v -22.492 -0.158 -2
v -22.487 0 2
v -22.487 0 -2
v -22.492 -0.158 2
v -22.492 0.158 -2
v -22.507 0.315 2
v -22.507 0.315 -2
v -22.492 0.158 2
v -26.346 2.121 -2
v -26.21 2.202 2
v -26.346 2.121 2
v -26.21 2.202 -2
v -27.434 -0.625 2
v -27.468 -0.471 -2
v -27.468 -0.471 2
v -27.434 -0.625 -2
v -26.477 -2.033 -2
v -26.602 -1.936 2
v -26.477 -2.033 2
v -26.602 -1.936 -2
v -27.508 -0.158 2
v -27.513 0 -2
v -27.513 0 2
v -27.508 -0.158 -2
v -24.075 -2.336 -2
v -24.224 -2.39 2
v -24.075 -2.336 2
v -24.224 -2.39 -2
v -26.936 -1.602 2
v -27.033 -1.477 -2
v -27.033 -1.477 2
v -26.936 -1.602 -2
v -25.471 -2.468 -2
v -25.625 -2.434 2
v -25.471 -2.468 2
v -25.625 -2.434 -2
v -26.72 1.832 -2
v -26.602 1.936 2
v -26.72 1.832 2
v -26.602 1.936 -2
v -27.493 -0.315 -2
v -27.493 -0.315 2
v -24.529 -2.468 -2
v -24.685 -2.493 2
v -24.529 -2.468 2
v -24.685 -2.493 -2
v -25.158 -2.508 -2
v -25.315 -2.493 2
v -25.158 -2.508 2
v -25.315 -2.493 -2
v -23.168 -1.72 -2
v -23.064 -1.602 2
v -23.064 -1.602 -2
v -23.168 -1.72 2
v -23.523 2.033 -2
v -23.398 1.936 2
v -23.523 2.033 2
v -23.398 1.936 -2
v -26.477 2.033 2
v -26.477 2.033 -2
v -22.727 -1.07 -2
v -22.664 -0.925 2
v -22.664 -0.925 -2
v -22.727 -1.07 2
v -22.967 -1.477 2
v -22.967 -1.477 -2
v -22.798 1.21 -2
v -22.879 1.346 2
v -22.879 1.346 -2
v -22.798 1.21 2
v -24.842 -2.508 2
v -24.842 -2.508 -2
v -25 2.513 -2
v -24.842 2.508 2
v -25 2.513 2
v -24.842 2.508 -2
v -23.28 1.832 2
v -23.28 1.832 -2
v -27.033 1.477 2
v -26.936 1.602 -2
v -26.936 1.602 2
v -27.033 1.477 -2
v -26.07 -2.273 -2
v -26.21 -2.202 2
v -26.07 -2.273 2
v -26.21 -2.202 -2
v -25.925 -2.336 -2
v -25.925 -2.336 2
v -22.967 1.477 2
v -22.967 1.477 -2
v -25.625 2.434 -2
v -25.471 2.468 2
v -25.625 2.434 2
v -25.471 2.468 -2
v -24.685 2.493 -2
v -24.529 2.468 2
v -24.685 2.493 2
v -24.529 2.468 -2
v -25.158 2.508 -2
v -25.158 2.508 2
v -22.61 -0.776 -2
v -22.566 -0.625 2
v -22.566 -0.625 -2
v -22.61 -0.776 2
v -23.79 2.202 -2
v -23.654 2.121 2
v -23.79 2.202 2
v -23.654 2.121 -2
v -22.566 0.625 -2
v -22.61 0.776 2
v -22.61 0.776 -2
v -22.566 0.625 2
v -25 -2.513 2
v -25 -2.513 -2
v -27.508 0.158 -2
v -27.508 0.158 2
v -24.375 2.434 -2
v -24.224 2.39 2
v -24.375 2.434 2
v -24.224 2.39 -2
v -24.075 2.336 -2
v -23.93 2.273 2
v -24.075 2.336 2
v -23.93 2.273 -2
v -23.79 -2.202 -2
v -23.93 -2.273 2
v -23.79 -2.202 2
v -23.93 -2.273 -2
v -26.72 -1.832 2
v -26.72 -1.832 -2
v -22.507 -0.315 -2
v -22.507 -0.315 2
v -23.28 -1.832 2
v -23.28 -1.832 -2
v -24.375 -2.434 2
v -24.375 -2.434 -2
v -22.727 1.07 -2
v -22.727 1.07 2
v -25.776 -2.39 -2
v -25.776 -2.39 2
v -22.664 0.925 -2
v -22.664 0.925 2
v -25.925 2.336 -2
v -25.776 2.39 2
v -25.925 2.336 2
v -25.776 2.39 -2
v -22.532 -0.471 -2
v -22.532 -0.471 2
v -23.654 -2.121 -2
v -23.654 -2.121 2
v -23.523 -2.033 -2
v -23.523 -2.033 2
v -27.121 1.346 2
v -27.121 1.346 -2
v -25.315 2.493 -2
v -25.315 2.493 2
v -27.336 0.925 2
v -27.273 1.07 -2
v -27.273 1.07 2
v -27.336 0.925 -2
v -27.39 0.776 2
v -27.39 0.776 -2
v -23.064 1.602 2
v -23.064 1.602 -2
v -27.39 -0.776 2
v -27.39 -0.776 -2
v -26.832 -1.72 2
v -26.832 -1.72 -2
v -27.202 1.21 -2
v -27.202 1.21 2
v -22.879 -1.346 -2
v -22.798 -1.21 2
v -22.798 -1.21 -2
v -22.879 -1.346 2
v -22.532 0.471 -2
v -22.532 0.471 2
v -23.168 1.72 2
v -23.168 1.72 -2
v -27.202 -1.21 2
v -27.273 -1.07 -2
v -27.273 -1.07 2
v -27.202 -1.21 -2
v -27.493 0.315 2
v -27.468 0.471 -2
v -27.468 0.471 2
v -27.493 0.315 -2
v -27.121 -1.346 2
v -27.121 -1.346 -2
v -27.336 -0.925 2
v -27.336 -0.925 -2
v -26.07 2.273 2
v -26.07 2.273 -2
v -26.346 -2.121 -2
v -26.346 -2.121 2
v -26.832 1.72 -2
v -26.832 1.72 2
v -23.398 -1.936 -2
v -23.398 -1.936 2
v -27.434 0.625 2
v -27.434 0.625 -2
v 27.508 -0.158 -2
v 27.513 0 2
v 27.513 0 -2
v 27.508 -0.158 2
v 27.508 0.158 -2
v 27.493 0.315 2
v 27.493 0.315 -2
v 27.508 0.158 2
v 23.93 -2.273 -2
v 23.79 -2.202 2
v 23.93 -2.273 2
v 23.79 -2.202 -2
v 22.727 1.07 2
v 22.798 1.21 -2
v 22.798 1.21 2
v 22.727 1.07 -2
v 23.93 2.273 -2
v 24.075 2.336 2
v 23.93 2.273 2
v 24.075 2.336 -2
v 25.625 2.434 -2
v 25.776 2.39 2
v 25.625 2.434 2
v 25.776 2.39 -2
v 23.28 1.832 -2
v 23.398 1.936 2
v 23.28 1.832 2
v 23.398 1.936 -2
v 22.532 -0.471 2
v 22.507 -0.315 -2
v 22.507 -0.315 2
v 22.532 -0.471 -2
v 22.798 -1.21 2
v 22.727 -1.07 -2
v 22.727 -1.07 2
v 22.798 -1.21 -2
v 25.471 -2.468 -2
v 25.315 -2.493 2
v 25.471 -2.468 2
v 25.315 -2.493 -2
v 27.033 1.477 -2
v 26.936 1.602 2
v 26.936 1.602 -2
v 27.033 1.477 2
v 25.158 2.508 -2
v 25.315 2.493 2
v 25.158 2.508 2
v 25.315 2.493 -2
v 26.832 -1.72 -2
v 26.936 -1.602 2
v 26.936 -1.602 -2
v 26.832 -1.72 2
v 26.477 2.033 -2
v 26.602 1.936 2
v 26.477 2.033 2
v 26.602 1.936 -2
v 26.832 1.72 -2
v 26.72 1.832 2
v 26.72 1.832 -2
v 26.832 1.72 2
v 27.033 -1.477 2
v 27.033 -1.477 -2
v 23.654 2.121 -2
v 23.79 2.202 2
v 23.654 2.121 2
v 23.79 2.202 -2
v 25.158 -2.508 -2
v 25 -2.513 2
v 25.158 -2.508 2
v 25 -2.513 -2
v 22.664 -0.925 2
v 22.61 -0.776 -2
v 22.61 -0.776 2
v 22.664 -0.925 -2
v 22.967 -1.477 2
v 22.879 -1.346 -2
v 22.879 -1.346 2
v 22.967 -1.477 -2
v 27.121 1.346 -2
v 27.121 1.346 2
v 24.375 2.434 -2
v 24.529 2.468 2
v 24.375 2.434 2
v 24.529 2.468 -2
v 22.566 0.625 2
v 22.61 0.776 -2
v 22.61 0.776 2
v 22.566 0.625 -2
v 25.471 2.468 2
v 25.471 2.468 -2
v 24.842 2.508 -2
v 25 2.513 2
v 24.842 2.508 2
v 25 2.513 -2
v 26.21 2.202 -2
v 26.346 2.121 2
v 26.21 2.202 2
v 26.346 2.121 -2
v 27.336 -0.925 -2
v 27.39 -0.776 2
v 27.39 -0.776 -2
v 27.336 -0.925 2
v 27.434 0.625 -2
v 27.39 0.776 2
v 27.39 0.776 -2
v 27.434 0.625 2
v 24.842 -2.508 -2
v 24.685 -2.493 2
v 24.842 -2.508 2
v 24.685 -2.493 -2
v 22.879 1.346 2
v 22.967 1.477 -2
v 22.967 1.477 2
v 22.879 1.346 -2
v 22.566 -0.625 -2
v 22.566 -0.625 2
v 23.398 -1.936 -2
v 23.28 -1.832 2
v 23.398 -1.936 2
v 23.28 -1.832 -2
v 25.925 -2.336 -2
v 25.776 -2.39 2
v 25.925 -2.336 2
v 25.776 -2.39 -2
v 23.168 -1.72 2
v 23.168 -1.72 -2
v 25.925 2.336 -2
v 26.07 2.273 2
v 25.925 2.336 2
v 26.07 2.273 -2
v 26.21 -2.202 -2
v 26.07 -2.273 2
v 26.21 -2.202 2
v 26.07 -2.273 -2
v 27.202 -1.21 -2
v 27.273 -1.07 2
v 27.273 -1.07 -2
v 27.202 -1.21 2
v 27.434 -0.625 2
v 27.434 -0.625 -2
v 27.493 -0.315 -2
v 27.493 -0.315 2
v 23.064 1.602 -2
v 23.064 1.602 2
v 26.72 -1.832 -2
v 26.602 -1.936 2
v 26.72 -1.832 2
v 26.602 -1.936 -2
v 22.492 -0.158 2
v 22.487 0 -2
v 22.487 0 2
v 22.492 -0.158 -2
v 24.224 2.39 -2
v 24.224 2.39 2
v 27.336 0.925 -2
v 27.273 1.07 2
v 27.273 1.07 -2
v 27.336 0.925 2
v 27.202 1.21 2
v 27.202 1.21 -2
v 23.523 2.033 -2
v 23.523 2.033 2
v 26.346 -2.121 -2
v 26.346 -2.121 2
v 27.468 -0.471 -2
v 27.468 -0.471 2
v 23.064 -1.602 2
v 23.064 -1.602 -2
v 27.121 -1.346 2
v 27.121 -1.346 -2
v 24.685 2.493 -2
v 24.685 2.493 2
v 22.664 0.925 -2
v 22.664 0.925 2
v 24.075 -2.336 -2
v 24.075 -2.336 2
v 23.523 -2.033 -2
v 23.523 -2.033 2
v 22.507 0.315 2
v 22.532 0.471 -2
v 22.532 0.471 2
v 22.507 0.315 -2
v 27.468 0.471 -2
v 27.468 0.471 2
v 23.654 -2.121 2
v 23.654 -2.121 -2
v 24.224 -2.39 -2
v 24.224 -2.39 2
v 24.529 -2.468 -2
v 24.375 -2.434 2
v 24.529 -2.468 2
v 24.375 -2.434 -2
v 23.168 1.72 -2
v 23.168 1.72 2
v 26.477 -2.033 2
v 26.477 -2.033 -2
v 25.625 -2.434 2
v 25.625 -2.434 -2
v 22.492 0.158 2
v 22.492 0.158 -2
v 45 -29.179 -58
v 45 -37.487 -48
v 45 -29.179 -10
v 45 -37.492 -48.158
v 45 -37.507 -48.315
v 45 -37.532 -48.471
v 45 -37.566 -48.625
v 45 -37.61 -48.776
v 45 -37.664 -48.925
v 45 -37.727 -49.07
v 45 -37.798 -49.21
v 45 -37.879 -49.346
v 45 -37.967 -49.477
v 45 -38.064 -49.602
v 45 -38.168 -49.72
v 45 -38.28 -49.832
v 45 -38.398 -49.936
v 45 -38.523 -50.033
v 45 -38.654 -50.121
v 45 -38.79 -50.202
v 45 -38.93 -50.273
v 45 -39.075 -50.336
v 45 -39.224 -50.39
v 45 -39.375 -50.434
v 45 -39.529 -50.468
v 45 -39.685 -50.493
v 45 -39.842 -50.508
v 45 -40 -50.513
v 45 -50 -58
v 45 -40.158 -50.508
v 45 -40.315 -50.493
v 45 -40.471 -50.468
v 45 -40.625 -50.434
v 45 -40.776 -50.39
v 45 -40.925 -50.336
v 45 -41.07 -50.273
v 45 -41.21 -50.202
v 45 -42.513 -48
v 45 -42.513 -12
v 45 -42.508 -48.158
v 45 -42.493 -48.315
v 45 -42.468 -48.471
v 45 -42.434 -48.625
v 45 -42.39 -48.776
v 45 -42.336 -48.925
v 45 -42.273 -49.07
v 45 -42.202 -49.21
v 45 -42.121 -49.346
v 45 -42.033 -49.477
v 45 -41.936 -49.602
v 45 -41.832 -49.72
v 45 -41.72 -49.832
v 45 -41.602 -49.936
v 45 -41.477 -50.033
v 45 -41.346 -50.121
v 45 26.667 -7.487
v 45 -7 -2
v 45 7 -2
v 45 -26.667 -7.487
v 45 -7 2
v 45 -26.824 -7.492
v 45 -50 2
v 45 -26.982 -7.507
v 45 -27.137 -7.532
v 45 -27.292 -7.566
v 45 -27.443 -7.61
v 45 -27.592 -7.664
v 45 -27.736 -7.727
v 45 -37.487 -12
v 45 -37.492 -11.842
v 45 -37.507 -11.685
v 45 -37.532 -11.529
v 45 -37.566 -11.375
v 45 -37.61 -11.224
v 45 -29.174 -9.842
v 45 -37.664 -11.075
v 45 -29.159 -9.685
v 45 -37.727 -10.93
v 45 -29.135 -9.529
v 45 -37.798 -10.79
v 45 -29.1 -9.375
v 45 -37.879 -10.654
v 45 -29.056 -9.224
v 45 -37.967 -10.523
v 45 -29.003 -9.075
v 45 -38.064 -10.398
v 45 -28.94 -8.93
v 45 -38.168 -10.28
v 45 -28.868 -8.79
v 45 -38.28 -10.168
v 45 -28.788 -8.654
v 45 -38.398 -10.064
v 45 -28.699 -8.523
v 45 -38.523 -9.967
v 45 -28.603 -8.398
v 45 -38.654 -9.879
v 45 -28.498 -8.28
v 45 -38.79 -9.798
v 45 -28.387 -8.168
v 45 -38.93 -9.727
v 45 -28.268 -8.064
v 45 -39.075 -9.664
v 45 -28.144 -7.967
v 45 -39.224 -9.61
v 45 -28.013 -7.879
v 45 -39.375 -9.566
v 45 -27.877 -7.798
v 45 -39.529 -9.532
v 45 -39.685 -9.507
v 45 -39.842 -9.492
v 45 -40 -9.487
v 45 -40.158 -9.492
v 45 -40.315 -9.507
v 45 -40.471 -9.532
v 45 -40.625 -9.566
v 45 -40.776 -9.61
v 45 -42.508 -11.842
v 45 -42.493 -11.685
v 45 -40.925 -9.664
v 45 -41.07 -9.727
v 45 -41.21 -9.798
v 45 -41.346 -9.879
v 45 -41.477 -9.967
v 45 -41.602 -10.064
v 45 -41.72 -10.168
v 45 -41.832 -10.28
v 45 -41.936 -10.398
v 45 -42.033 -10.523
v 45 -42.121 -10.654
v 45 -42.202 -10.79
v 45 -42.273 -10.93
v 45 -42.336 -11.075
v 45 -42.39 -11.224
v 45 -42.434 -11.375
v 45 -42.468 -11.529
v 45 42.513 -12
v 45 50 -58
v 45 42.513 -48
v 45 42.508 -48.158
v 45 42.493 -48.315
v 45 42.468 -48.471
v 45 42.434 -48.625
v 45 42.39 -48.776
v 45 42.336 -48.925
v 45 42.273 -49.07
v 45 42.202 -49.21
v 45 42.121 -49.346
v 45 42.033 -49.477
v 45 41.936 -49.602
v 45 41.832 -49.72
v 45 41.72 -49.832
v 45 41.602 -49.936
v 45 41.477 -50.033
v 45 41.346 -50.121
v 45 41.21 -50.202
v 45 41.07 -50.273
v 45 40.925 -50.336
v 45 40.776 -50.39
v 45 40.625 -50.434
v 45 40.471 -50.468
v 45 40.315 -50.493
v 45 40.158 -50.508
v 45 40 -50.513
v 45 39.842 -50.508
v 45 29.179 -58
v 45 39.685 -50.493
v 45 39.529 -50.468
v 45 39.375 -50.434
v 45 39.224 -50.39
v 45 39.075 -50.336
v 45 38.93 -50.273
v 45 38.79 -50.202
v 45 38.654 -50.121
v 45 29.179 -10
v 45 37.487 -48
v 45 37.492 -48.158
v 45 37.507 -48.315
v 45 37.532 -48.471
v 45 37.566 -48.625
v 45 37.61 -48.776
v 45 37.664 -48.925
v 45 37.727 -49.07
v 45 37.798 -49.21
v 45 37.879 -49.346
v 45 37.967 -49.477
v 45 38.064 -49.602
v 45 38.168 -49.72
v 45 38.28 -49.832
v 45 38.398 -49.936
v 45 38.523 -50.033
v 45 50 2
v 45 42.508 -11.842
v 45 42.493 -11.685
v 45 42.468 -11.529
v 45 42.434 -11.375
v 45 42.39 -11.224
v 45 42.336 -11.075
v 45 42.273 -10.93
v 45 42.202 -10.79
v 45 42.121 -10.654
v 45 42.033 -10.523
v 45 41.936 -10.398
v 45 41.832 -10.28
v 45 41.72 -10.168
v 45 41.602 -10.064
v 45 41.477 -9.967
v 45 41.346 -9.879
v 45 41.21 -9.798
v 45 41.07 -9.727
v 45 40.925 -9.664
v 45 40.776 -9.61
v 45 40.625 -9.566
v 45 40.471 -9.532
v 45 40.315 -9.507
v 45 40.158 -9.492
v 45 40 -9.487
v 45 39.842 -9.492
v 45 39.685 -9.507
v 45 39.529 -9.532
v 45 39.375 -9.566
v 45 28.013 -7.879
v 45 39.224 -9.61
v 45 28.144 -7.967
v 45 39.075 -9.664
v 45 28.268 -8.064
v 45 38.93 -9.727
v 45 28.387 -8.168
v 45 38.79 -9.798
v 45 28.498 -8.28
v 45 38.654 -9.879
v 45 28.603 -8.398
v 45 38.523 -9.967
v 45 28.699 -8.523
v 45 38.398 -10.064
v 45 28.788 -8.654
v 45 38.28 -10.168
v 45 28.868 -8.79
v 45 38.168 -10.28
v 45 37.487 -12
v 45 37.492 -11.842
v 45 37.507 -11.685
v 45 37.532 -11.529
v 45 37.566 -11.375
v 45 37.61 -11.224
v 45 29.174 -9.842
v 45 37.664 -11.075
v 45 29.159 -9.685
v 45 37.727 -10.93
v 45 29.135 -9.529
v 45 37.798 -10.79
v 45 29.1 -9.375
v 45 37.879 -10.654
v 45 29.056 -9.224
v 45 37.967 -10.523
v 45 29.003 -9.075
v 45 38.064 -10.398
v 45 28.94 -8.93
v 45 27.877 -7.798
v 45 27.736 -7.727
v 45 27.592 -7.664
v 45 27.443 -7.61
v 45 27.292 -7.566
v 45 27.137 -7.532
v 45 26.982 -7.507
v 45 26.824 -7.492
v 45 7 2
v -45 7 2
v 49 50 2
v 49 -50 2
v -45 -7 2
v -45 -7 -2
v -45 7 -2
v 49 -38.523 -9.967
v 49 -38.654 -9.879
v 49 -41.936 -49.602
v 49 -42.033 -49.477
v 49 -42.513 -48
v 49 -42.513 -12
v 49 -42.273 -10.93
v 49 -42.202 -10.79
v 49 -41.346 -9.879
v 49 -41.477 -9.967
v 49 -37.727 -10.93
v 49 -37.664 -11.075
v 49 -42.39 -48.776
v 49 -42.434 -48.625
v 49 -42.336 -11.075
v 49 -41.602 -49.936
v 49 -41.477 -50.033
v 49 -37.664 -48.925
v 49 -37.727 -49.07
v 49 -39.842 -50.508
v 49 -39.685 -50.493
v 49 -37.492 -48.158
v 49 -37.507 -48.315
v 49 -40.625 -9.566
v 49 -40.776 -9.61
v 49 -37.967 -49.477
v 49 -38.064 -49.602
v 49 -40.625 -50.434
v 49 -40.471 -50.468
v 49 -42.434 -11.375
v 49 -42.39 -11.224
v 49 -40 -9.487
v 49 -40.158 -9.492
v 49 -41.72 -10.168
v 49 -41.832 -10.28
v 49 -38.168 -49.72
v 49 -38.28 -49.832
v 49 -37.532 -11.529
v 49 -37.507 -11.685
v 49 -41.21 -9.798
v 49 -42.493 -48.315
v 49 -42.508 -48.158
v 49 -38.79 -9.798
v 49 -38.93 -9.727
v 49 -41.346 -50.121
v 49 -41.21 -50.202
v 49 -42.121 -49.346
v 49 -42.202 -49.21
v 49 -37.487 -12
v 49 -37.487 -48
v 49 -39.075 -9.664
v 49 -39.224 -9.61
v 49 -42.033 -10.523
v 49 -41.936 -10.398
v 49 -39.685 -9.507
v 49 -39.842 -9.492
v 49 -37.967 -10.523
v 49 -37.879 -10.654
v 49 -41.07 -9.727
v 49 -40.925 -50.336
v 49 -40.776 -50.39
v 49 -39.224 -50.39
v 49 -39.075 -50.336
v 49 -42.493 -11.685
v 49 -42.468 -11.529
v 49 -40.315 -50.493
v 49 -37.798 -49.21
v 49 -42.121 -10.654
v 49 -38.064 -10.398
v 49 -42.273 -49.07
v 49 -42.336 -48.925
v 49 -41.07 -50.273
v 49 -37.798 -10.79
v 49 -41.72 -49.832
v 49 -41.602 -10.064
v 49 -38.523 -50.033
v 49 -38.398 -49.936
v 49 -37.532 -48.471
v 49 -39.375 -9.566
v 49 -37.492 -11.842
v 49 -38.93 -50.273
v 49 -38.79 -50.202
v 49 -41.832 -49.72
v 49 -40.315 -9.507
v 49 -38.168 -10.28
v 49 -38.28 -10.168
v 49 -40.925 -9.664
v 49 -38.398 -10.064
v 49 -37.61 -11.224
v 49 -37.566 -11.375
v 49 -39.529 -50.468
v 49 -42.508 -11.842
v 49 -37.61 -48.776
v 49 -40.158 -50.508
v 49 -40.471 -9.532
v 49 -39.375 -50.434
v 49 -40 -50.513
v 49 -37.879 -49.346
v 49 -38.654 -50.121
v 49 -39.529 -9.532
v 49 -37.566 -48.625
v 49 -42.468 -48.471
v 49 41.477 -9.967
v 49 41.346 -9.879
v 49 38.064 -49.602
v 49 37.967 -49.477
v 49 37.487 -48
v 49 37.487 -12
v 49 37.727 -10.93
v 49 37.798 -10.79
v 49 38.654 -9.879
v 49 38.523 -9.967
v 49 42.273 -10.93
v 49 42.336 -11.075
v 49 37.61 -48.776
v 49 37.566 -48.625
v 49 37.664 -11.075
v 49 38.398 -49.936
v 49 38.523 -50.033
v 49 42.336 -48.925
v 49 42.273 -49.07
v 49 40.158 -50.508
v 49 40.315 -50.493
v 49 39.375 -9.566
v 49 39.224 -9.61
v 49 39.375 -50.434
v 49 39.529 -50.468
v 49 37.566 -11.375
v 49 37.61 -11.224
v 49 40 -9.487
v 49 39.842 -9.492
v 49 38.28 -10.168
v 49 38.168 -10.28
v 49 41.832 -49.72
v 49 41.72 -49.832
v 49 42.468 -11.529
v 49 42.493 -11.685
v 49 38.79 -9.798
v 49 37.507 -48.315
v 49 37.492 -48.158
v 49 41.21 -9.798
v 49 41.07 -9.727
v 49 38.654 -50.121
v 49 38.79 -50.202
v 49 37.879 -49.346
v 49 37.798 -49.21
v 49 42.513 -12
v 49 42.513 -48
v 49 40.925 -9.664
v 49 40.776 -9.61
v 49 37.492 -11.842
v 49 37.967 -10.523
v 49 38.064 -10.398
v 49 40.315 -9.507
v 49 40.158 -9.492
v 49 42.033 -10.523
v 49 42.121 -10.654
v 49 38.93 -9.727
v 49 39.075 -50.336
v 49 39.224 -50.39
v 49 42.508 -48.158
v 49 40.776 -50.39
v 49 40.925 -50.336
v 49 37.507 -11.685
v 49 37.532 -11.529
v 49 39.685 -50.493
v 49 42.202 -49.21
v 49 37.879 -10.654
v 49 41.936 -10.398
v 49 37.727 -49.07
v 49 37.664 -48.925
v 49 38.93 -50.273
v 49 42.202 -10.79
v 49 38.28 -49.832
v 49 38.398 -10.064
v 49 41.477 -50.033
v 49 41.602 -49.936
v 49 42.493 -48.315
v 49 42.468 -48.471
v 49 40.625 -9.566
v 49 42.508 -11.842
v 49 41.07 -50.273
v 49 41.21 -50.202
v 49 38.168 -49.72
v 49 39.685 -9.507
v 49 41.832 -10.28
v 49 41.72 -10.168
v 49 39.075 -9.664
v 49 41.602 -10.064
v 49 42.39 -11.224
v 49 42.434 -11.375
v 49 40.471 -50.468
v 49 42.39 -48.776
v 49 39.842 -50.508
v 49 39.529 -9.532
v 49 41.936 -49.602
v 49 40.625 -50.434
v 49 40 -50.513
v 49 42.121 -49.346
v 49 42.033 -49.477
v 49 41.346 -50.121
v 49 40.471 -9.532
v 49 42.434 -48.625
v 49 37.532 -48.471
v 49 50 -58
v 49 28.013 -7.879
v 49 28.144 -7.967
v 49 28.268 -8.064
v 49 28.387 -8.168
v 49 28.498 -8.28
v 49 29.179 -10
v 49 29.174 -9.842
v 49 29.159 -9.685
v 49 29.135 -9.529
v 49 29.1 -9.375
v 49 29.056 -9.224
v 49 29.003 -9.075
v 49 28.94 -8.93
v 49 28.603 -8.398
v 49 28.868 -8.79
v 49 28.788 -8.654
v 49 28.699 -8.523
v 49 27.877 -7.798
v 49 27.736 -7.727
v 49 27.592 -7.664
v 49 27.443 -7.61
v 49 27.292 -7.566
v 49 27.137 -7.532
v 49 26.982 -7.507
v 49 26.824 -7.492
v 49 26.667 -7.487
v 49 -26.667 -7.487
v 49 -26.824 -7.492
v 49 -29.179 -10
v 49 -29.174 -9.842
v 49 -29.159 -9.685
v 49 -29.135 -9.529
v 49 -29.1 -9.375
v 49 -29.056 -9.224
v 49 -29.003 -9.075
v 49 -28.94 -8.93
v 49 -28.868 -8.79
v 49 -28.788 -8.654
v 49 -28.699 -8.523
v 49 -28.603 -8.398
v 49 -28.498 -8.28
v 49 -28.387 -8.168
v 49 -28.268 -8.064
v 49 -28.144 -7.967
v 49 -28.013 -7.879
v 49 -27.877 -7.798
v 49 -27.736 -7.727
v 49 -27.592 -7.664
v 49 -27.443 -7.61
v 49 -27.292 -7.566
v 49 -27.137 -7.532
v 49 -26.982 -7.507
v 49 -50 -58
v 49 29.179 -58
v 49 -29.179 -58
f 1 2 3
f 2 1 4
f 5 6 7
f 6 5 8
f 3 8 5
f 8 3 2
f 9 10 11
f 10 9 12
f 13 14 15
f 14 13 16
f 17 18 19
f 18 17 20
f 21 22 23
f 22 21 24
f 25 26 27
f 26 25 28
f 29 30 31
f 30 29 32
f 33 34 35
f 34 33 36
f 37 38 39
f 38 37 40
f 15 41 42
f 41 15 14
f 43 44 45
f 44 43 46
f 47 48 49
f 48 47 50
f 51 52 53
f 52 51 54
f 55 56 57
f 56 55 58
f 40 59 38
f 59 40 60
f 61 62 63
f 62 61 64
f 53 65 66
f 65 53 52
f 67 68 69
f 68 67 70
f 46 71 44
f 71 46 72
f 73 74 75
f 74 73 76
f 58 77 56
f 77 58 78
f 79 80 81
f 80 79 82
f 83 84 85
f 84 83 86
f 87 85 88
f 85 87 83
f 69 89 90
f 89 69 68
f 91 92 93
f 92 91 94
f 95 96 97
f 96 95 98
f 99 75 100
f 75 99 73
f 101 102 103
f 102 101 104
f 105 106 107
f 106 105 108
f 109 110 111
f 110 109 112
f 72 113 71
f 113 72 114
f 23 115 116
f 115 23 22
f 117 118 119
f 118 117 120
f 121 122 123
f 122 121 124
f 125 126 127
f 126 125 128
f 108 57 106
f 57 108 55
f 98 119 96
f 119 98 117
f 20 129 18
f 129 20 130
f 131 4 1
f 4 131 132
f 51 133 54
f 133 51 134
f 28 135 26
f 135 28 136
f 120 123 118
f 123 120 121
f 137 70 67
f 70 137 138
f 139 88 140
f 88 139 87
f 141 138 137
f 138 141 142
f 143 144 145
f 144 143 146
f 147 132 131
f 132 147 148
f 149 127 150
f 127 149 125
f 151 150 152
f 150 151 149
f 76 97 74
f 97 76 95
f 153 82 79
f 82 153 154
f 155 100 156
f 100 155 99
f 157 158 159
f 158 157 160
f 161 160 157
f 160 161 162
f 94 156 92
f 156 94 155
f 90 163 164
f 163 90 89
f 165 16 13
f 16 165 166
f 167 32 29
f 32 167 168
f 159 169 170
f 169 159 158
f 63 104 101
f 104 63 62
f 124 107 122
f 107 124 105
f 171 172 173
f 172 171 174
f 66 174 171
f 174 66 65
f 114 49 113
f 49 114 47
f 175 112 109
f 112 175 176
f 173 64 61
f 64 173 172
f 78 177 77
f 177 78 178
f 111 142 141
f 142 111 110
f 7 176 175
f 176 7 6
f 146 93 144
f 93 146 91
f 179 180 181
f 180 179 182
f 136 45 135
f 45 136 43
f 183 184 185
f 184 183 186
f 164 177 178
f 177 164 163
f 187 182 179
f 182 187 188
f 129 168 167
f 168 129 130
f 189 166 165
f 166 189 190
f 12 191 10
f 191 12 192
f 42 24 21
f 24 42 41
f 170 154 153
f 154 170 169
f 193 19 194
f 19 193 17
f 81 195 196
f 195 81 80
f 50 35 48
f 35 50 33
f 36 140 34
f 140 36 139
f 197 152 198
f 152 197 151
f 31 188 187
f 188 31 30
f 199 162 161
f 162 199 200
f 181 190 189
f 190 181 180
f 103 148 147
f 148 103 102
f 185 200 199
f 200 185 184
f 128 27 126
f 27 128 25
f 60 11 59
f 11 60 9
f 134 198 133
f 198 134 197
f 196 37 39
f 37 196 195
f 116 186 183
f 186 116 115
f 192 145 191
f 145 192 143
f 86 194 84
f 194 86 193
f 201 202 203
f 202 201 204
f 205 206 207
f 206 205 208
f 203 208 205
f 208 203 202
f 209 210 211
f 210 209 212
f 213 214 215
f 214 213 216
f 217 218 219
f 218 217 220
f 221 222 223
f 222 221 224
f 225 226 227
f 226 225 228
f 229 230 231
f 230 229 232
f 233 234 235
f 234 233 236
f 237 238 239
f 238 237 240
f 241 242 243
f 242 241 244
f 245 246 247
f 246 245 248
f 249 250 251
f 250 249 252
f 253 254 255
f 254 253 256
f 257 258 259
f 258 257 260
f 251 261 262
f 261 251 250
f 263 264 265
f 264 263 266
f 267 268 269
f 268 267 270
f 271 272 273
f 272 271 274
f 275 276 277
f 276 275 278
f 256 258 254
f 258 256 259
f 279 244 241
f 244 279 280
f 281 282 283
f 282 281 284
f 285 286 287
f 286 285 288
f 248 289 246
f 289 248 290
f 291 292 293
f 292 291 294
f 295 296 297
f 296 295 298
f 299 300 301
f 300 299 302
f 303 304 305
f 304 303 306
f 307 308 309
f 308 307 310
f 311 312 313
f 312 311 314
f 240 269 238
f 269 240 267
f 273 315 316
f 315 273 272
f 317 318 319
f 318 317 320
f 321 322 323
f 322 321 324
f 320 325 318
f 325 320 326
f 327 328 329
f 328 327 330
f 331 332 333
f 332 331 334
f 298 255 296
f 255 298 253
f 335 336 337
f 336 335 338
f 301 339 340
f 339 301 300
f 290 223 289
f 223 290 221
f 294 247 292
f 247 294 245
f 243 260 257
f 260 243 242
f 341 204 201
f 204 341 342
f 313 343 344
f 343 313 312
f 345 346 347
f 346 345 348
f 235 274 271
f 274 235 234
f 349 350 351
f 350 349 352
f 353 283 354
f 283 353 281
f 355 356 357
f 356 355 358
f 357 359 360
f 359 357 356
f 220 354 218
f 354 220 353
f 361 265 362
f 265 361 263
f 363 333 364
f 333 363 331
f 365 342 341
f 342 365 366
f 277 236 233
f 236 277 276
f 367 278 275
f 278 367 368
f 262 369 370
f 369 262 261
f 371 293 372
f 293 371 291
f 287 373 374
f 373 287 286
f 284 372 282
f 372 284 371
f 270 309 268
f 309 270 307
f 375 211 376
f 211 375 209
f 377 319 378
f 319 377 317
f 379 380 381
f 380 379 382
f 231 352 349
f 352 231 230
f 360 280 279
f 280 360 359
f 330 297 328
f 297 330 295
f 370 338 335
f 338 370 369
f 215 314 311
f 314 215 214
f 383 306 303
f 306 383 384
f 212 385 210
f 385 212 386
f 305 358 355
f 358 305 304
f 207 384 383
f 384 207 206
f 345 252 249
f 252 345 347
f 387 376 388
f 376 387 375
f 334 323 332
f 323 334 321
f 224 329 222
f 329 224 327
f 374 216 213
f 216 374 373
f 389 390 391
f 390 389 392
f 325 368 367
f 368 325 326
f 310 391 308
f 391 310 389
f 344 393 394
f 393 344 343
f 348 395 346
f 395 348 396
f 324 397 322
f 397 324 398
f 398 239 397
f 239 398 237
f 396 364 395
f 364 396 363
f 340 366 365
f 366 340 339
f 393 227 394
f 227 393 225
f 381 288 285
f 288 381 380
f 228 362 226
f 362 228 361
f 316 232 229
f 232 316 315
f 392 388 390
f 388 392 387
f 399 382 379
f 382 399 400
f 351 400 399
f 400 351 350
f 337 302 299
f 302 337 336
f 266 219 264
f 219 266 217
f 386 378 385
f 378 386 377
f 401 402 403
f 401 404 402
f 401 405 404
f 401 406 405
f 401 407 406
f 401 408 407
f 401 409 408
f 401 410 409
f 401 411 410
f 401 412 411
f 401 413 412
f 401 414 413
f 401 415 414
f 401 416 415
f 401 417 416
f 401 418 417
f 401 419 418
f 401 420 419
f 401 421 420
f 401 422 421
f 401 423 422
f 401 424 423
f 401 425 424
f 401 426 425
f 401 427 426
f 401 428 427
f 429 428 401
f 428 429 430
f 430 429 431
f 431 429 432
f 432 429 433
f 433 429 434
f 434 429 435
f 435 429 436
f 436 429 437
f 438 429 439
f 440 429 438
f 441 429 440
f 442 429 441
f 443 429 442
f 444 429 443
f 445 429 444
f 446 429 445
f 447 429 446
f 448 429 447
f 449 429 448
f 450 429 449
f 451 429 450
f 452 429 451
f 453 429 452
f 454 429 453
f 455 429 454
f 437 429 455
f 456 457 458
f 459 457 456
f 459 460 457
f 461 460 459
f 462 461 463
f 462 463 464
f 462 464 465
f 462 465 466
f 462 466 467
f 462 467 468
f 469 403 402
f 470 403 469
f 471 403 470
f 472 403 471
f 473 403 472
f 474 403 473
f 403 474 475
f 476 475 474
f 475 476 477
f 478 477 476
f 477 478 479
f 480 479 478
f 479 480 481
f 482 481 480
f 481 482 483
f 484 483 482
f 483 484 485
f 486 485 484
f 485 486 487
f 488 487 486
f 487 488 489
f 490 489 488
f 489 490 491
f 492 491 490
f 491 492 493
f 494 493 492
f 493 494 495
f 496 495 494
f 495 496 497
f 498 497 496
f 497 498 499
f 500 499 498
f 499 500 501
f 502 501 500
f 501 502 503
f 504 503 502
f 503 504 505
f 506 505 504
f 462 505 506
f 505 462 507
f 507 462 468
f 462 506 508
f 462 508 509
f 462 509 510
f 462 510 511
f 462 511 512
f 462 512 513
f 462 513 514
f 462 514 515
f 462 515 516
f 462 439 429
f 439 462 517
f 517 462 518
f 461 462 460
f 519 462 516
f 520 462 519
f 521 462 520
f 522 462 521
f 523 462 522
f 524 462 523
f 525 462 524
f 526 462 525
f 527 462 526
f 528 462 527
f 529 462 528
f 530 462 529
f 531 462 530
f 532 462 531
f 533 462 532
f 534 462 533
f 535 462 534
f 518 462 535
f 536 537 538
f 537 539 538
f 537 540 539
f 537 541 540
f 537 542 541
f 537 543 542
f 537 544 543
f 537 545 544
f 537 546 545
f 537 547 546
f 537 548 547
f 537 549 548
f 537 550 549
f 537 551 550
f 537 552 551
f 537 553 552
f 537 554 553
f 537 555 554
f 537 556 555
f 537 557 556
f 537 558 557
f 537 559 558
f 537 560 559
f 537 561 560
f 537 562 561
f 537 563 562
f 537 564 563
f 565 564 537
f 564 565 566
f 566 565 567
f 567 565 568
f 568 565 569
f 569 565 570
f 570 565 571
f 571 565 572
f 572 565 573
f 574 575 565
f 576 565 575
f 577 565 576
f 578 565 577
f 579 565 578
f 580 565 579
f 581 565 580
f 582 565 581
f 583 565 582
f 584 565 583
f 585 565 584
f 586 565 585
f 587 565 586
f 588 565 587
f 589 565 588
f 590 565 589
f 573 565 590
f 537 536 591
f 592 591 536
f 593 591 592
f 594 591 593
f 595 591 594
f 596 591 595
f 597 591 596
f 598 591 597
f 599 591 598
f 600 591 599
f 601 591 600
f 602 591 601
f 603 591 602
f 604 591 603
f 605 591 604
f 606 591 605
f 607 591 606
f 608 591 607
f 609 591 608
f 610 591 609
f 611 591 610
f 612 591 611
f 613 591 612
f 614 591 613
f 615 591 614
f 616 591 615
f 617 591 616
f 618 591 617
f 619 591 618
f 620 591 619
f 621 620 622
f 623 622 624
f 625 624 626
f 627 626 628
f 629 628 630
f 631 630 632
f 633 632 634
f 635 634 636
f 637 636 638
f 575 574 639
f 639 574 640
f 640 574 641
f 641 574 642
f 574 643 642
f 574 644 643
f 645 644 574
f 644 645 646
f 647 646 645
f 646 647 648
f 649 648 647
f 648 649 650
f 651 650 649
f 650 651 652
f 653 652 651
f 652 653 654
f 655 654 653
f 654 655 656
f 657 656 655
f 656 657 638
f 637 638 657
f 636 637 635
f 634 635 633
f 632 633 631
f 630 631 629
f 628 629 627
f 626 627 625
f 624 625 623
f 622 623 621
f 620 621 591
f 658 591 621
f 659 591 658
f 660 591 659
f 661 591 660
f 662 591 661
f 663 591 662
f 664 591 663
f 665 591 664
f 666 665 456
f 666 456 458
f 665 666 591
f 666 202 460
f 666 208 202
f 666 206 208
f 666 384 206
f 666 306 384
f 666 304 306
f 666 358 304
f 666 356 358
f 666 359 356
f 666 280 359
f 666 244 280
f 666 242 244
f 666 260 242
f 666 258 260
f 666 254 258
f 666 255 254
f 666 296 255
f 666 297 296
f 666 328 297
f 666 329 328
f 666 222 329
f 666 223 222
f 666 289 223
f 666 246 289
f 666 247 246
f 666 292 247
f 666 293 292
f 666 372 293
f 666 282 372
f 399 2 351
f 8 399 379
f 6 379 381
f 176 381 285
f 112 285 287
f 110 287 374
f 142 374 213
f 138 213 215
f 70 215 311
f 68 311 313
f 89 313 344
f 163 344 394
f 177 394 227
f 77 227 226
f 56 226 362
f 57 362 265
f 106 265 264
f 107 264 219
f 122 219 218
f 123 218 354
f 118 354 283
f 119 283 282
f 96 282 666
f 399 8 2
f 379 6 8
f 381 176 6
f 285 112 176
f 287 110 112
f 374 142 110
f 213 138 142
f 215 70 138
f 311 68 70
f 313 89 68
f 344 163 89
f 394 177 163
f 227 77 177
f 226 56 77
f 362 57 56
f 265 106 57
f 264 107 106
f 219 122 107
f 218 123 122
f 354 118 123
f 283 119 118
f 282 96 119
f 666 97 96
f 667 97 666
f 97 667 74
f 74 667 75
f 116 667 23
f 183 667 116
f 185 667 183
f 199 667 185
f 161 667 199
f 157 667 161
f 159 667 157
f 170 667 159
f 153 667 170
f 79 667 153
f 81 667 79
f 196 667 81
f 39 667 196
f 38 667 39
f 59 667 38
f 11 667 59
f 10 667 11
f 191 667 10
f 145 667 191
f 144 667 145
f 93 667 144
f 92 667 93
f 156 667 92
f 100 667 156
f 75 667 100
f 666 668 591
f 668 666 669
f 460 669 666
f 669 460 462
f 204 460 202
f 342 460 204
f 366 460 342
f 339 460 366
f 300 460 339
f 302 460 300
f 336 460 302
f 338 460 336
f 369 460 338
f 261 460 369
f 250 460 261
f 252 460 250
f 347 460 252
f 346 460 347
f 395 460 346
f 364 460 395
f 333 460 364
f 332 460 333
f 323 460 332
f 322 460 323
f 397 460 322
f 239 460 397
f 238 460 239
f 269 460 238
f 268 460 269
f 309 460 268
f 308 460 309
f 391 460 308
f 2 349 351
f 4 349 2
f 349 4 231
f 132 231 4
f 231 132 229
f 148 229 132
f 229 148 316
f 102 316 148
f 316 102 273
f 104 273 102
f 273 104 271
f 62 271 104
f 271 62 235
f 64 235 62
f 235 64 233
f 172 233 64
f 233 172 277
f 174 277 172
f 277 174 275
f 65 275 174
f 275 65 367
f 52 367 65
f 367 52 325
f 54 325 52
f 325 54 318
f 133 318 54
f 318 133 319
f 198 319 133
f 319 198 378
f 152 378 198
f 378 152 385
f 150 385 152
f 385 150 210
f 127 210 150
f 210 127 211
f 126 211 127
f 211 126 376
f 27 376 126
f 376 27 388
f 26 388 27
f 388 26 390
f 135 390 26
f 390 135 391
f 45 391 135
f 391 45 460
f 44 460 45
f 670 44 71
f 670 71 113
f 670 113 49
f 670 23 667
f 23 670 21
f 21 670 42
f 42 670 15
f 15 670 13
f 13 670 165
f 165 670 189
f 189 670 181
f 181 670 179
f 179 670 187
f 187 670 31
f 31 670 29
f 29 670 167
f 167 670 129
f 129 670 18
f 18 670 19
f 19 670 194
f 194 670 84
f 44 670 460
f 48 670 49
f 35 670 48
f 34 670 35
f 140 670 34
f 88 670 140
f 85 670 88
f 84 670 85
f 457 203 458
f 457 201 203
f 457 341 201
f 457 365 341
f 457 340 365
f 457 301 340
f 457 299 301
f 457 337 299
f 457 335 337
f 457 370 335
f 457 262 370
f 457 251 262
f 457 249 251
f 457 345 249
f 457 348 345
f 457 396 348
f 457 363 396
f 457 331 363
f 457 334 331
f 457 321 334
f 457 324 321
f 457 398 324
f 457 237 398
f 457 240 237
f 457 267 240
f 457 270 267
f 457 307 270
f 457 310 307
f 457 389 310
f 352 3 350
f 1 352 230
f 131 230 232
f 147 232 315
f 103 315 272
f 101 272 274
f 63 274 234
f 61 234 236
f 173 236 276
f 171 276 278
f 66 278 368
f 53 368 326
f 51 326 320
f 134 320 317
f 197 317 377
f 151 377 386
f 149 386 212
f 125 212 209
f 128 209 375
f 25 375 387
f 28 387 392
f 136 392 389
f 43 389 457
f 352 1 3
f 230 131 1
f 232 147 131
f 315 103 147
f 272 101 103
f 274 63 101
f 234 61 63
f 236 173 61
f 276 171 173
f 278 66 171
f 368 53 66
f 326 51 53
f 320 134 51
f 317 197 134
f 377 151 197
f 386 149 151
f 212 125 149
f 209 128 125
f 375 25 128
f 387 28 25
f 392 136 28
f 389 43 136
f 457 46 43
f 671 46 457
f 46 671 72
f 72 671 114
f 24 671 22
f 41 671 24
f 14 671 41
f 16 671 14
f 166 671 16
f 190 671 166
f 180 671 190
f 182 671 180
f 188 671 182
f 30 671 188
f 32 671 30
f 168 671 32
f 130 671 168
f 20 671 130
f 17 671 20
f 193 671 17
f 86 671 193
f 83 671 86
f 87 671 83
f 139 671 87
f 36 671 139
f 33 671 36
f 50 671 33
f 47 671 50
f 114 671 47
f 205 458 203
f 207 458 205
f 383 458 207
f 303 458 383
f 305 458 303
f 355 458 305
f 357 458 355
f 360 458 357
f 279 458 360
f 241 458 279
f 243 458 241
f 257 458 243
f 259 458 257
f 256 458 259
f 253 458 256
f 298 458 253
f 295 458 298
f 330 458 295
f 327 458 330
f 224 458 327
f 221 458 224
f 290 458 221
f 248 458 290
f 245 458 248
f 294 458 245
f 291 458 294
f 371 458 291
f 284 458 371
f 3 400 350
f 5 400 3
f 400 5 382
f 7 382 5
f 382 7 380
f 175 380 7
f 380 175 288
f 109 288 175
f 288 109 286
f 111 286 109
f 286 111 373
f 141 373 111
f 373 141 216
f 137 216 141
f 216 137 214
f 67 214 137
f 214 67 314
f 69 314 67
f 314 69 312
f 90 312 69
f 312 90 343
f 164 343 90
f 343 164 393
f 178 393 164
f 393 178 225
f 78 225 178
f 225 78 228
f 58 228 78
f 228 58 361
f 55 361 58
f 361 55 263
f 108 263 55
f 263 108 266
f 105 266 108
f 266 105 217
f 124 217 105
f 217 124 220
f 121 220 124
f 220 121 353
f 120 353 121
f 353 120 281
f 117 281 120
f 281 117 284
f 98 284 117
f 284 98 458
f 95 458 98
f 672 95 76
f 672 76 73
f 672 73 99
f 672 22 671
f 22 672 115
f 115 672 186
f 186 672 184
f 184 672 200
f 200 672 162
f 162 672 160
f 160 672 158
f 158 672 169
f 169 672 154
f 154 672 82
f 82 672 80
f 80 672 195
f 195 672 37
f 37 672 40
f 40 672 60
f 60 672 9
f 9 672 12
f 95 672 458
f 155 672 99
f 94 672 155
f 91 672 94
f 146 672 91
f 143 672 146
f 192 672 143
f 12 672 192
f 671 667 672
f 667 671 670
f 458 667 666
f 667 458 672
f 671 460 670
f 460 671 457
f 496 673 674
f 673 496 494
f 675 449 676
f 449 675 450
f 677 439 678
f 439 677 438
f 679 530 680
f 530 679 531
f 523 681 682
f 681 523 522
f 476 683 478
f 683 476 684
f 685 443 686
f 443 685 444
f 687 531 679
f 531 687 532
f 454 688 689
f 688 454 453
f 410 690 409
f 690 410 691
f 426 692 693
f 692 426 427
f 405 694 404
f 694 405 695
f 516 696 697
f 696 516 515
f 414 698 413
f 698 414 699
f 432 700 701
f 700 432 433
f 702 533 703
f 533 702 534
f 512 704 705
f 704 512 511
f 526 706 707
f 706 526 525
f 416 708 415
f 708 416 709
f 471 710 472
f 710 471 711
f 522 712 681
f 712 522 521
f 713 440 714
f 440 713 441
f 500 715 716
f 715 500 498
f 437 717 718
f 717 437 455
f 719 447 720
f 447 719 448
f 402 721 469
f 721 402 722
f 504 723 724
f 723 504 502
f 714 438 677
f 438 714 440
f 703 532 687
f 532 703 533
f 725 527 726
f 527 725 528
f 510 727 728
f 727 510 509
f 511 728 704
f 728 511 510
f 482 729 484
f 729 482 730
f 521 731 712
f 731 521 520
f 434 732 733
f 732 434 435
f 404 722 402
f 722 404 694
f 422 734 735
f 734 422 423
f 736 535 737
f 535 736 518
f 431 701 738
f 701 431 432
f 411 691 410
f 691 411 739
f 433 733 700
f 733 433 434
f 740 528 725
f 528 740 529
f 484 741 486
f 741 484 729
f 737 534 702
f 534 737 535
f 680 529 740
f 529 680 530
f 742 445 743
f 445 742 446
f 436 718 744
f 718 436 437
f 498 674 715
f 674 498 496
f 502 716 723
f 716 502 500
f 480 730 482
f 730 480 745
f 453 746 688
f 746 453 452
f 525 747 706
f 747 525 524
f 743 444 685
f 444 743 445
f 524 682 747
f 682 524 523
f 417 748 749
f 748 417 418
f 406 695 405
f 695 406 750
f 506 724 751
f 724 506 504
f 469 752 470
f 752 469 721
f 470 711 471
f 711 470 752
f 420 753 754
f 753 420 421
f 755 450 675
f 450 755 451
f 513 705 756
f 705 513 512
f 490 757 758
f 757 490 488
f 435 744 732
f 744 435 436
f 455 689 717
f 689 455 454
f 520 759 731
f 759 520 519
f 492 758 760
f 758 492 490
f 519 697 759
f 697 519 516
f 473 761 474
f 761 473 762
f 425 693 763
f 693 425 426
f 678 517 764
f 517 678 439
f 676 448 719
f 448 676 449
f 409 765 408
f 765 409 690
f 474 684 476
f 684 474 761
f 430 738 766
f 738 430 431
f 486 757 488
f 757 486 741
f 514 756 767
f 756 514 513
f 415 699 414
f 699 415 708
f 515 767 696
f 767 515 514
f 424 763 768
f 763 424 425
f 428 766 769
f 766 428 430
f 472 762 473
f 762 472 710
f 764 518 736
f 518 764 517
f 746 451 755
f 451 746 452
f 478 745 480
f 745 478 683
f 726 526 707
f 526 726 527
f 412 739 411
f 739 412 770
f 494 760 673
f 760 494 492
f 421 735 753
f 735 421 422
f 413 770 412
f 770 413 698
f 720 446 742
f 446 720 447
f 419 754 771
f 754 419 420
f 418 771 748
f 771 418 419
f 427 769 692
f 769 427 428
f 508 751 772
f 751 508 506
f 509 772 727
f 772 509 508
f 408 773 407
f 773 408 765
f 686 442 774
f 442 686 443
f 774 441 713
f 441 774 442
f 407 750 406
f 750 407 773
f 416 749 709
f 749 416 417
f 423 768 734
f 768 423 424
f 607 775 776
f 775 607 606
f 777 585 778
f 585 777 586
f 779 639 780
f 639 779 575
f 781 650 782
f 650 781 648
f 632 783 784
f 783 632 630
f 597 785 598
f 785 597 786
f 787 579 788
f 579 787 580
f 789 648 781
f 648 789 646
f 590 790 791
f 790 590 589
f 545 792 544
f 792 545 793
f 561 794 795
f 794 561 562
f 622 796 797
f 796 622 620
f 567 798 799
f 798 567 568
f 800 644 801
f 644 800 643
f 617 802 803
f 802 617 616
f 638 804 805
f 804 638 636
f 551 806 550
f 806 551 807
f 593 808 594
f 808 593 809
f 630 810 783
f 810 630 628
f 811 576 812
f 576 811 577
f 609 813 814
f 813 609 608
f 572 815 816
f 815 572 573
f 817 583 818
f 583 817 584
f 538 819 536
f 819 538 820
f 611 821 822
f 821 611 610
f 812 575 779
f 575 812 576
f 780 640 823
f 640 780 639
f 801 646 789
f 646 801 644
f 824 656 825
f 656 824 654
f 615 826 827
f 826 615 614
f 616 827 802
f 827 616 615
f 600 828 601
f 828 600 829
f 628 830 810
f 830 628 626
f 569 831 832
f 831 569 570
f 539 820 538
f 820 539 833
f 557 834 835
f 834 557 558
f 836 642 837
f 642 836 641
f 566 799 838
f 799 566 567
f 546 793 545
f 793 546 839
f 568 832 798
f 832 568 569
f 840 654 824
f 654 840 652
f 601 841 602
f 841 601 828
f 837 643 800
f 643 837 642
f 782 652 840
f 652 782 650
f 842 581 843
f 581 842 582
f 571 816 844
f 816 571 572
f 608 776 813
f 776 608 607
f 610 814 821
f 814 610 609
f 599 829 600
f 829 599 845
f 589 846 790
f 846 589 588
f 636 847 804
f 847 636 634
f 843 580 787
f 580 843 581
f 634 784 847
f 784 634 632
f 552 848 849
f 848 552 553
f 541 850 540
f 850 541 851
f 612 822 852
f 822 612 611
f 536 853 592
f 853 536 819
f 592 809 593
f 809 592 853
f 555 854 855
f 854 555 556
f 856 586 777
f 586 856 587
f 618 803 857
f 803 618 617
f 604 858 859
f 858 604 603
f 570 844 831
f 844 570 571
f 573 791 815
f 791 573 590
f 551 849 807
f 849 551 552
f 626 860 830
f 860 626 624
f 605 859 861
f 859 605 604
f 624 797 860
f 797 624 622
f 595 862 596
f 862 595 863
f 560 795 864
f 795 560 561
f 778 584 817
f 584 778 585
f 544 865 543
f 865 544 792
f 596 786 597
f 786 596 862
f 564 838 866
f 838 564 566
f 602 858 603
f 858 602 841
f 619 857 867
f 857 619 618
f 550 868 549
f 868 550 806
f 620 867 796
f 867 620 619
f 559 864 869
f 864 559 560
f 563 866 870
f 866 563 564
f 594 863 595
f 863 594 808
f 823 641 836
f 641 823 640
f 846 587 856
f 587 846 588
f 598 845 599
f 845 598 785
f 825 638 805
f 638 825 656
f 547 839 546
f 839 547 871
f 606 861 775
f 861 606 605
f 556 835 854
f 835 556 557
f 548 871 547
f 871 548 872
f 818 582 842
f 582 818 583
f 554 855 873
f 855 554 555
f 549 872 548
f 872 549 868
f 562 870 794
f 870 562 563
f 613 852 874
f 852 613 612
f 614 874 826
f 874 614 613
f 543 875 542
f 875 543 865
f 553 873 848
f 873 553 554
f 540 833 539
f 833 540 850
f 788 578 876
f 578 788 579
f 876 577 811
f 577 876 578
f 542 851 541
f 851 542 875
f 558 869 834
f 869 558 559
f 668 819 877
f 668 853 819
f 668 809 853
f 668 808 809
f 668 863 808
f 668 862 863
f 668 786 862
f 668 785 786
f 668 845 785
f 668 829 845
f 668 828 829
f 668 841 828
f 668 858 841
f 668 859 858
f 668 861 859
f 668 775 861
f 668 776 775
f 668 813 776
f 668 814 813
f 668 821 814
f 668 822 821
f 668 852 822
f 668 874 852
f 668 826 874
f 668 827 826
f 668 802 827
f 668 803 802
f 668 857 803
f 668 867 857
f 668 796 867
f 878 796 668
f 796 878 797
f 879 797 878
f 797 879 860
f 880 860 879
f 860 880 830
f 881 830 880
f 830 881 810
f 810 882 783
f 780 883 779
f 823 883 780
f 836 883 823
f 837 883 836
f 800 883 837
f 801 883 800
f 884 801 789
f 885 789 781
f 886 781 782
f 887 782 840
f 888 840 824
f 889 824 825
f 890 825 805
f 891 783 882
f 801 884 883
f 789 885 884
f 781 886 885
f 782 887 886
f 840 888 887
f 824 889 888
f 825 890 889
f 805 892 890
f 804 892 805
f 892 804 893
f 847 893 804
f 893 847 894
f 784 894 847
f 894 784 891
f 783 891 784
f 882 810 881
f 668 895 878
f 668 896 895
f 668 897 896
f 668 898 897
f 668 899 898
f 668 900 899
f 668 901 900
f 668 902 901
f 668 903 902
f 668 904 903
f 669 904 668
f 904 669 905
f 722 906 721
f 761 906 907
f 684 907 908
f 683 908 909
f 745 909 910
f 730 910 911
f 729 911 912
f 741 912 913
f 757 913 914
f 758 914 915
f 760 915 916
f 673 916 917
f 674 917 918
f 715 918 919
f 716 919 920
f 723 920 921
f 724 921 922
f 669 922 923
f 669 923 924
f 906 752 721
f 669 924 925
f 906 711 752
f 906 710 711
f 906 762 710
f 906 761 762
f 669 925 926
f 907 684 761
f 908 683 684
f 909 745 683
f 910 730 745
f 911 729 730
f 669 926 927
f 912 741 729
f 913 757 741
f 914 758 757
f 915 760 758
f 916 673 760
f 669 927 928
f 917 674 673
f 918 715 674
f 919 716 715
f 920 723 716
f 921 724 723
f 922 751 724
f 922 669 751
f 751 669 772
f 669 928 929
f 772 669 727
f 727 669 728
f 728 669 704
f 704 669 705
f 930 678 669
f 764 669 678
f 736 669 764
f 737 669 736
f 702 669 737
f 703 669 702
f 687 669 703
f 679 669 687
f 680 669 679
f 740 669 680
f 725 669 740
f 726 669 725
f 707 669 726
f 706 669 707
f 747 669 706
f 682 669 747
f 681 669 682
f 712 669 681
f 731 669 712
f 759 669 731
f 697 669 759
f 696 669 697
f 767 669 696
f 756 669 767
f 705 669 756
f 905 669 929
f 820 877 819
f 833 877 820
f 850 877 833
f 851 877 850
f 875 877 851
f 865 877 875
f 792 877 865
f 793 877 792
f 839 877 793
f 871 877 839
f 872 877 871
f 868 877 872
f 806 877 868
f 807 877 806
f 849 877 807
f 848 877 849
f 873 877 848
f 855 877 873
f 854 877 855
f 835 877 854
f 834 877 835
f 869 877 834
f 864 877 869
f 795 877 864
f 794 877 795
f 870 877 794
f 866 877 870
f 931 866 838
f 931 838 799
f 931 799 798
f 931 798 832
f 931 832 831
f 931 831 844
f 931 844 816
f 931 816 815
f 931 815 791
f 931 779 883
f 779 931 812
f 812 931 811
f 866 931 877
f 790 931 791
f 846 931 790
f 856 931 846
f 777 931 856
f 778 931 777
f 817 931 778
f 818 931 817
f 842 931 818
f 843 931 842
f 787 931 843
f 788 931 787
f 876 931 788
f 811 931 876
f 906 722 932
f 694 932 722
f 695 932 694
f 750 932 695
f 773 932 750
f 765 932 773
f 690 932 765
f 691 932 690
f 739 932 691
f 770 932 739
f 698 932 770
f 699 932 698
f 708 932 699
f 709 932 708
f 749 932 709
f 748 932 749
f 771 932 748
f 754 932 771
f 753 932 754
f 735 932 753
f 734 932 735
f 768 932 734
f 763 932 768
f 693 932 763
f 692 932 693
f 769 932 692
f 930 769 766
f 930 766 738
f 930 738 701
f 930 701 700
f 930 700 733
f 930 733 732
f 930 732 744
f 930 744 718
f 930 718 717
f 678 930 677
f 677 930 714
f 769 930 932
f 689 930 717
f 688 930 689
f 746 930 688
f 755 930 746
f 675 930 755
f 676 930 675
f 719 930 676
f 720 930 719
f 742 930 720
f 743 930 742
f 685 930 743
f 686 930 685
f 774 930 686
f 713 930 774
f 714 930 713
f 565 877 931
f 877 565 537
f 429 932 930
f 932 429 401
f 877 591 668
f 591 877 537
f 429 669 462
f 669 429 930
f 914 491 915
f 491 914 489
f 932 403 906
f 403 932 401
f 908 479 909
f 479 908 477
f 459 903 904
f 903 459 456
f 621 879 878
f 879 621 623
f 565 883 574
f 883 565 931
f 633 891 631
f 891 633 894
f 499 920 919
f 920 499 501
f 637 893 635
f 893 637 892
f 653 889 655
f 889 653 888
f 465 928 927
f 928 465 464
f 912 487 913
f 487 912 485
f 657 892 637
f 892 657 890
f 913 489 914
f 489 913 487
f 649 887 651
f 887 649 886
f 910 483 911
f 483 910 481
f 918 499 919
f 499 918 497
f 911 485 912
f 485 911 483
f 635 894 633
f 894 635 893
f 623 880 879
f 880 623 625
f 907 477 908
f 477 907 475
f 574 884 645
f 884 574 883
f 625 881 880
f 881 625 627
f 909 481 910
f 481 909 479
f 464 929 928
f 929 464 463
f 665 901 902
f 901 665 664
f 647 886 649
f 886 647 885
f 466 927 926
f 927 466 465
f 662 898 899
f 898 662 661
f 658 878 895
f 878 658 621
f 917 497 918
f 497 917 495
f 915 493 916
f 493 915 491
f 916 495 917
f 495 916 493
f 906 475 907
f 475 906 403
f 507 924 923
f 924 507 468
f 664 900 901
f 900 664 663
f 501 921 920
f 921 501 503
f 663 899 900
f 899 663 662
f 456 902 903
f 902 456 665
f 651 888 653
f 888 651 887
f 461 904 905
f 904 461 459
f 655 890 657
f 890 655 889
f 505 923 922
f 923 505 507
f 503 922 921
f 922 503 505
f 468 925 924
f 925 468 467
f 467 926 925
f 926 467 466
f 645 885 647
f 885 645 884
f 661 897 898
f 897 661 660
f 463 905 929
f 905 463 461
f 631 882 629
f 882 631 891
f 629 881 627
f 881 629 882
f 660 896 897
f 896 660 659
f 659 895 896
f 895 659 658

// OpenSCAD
d=4; //thickness

car_hole_d=5; //Carrierhole diameter
car_hole_gap=50; //e

car_at_l=90;
car_at_b=14;

car_tot_b=100;
car_tot_h=60;
fan_gap=80;

if (car_hole_gap>car_at_l){
 echo("gap bigger material");
}
else{
//////////////////////////////////////////////////////////////////////////
difference(){
	cube([car_at_l,car_at_b,d],true);
	for(i=[-1,1]){
		translate([i*0.5*car_hole_gap,0,0]){
			cylinder(d*2,car_hole_d/1.99,car_hole_d/1.99,true,$fn=100);
		}
	}
}
////////////////////////////////////////////////////////////////////////
difference(){
	translate([(car_at_l+d)/2,0,-car_tot_h/2+d/2]){
		cube([d,car_tot_b,car_tot_h],true);
	}
	for(i=[-1,1]){
		hull(){
			translate([(car_at_l+d)/2,i*fan_gap*0.5,-0.2*car_tot_h]){	rotate([0,90,0]){
				cylinder(d*2,car_hole_d/1.99,car_hole_d/1.99,true,$fn=100);
			}}
			translate([(car_at_l+d)/2,i*fan_gap*0.5,-0.8*car_tot_h]){	rotate([0,90,0]){
				cylinder(d*2,car_hole_d/1.99,car_hole_d/1.99,true,$fn=100);
			}}
		}
	}
	hull(){for(i=[-4,4],k=[1,6]){
		translate([((car_at_l+d)/2),(i/6)*fan_gap*0.5,-car_tot_h*(k/6)]){	rotate([0,90,0]){
				cylinder(d*2,car_hole_d/1.99,car_hole_d/1.99,true,$fn=100);
		}}
	}}
}}
